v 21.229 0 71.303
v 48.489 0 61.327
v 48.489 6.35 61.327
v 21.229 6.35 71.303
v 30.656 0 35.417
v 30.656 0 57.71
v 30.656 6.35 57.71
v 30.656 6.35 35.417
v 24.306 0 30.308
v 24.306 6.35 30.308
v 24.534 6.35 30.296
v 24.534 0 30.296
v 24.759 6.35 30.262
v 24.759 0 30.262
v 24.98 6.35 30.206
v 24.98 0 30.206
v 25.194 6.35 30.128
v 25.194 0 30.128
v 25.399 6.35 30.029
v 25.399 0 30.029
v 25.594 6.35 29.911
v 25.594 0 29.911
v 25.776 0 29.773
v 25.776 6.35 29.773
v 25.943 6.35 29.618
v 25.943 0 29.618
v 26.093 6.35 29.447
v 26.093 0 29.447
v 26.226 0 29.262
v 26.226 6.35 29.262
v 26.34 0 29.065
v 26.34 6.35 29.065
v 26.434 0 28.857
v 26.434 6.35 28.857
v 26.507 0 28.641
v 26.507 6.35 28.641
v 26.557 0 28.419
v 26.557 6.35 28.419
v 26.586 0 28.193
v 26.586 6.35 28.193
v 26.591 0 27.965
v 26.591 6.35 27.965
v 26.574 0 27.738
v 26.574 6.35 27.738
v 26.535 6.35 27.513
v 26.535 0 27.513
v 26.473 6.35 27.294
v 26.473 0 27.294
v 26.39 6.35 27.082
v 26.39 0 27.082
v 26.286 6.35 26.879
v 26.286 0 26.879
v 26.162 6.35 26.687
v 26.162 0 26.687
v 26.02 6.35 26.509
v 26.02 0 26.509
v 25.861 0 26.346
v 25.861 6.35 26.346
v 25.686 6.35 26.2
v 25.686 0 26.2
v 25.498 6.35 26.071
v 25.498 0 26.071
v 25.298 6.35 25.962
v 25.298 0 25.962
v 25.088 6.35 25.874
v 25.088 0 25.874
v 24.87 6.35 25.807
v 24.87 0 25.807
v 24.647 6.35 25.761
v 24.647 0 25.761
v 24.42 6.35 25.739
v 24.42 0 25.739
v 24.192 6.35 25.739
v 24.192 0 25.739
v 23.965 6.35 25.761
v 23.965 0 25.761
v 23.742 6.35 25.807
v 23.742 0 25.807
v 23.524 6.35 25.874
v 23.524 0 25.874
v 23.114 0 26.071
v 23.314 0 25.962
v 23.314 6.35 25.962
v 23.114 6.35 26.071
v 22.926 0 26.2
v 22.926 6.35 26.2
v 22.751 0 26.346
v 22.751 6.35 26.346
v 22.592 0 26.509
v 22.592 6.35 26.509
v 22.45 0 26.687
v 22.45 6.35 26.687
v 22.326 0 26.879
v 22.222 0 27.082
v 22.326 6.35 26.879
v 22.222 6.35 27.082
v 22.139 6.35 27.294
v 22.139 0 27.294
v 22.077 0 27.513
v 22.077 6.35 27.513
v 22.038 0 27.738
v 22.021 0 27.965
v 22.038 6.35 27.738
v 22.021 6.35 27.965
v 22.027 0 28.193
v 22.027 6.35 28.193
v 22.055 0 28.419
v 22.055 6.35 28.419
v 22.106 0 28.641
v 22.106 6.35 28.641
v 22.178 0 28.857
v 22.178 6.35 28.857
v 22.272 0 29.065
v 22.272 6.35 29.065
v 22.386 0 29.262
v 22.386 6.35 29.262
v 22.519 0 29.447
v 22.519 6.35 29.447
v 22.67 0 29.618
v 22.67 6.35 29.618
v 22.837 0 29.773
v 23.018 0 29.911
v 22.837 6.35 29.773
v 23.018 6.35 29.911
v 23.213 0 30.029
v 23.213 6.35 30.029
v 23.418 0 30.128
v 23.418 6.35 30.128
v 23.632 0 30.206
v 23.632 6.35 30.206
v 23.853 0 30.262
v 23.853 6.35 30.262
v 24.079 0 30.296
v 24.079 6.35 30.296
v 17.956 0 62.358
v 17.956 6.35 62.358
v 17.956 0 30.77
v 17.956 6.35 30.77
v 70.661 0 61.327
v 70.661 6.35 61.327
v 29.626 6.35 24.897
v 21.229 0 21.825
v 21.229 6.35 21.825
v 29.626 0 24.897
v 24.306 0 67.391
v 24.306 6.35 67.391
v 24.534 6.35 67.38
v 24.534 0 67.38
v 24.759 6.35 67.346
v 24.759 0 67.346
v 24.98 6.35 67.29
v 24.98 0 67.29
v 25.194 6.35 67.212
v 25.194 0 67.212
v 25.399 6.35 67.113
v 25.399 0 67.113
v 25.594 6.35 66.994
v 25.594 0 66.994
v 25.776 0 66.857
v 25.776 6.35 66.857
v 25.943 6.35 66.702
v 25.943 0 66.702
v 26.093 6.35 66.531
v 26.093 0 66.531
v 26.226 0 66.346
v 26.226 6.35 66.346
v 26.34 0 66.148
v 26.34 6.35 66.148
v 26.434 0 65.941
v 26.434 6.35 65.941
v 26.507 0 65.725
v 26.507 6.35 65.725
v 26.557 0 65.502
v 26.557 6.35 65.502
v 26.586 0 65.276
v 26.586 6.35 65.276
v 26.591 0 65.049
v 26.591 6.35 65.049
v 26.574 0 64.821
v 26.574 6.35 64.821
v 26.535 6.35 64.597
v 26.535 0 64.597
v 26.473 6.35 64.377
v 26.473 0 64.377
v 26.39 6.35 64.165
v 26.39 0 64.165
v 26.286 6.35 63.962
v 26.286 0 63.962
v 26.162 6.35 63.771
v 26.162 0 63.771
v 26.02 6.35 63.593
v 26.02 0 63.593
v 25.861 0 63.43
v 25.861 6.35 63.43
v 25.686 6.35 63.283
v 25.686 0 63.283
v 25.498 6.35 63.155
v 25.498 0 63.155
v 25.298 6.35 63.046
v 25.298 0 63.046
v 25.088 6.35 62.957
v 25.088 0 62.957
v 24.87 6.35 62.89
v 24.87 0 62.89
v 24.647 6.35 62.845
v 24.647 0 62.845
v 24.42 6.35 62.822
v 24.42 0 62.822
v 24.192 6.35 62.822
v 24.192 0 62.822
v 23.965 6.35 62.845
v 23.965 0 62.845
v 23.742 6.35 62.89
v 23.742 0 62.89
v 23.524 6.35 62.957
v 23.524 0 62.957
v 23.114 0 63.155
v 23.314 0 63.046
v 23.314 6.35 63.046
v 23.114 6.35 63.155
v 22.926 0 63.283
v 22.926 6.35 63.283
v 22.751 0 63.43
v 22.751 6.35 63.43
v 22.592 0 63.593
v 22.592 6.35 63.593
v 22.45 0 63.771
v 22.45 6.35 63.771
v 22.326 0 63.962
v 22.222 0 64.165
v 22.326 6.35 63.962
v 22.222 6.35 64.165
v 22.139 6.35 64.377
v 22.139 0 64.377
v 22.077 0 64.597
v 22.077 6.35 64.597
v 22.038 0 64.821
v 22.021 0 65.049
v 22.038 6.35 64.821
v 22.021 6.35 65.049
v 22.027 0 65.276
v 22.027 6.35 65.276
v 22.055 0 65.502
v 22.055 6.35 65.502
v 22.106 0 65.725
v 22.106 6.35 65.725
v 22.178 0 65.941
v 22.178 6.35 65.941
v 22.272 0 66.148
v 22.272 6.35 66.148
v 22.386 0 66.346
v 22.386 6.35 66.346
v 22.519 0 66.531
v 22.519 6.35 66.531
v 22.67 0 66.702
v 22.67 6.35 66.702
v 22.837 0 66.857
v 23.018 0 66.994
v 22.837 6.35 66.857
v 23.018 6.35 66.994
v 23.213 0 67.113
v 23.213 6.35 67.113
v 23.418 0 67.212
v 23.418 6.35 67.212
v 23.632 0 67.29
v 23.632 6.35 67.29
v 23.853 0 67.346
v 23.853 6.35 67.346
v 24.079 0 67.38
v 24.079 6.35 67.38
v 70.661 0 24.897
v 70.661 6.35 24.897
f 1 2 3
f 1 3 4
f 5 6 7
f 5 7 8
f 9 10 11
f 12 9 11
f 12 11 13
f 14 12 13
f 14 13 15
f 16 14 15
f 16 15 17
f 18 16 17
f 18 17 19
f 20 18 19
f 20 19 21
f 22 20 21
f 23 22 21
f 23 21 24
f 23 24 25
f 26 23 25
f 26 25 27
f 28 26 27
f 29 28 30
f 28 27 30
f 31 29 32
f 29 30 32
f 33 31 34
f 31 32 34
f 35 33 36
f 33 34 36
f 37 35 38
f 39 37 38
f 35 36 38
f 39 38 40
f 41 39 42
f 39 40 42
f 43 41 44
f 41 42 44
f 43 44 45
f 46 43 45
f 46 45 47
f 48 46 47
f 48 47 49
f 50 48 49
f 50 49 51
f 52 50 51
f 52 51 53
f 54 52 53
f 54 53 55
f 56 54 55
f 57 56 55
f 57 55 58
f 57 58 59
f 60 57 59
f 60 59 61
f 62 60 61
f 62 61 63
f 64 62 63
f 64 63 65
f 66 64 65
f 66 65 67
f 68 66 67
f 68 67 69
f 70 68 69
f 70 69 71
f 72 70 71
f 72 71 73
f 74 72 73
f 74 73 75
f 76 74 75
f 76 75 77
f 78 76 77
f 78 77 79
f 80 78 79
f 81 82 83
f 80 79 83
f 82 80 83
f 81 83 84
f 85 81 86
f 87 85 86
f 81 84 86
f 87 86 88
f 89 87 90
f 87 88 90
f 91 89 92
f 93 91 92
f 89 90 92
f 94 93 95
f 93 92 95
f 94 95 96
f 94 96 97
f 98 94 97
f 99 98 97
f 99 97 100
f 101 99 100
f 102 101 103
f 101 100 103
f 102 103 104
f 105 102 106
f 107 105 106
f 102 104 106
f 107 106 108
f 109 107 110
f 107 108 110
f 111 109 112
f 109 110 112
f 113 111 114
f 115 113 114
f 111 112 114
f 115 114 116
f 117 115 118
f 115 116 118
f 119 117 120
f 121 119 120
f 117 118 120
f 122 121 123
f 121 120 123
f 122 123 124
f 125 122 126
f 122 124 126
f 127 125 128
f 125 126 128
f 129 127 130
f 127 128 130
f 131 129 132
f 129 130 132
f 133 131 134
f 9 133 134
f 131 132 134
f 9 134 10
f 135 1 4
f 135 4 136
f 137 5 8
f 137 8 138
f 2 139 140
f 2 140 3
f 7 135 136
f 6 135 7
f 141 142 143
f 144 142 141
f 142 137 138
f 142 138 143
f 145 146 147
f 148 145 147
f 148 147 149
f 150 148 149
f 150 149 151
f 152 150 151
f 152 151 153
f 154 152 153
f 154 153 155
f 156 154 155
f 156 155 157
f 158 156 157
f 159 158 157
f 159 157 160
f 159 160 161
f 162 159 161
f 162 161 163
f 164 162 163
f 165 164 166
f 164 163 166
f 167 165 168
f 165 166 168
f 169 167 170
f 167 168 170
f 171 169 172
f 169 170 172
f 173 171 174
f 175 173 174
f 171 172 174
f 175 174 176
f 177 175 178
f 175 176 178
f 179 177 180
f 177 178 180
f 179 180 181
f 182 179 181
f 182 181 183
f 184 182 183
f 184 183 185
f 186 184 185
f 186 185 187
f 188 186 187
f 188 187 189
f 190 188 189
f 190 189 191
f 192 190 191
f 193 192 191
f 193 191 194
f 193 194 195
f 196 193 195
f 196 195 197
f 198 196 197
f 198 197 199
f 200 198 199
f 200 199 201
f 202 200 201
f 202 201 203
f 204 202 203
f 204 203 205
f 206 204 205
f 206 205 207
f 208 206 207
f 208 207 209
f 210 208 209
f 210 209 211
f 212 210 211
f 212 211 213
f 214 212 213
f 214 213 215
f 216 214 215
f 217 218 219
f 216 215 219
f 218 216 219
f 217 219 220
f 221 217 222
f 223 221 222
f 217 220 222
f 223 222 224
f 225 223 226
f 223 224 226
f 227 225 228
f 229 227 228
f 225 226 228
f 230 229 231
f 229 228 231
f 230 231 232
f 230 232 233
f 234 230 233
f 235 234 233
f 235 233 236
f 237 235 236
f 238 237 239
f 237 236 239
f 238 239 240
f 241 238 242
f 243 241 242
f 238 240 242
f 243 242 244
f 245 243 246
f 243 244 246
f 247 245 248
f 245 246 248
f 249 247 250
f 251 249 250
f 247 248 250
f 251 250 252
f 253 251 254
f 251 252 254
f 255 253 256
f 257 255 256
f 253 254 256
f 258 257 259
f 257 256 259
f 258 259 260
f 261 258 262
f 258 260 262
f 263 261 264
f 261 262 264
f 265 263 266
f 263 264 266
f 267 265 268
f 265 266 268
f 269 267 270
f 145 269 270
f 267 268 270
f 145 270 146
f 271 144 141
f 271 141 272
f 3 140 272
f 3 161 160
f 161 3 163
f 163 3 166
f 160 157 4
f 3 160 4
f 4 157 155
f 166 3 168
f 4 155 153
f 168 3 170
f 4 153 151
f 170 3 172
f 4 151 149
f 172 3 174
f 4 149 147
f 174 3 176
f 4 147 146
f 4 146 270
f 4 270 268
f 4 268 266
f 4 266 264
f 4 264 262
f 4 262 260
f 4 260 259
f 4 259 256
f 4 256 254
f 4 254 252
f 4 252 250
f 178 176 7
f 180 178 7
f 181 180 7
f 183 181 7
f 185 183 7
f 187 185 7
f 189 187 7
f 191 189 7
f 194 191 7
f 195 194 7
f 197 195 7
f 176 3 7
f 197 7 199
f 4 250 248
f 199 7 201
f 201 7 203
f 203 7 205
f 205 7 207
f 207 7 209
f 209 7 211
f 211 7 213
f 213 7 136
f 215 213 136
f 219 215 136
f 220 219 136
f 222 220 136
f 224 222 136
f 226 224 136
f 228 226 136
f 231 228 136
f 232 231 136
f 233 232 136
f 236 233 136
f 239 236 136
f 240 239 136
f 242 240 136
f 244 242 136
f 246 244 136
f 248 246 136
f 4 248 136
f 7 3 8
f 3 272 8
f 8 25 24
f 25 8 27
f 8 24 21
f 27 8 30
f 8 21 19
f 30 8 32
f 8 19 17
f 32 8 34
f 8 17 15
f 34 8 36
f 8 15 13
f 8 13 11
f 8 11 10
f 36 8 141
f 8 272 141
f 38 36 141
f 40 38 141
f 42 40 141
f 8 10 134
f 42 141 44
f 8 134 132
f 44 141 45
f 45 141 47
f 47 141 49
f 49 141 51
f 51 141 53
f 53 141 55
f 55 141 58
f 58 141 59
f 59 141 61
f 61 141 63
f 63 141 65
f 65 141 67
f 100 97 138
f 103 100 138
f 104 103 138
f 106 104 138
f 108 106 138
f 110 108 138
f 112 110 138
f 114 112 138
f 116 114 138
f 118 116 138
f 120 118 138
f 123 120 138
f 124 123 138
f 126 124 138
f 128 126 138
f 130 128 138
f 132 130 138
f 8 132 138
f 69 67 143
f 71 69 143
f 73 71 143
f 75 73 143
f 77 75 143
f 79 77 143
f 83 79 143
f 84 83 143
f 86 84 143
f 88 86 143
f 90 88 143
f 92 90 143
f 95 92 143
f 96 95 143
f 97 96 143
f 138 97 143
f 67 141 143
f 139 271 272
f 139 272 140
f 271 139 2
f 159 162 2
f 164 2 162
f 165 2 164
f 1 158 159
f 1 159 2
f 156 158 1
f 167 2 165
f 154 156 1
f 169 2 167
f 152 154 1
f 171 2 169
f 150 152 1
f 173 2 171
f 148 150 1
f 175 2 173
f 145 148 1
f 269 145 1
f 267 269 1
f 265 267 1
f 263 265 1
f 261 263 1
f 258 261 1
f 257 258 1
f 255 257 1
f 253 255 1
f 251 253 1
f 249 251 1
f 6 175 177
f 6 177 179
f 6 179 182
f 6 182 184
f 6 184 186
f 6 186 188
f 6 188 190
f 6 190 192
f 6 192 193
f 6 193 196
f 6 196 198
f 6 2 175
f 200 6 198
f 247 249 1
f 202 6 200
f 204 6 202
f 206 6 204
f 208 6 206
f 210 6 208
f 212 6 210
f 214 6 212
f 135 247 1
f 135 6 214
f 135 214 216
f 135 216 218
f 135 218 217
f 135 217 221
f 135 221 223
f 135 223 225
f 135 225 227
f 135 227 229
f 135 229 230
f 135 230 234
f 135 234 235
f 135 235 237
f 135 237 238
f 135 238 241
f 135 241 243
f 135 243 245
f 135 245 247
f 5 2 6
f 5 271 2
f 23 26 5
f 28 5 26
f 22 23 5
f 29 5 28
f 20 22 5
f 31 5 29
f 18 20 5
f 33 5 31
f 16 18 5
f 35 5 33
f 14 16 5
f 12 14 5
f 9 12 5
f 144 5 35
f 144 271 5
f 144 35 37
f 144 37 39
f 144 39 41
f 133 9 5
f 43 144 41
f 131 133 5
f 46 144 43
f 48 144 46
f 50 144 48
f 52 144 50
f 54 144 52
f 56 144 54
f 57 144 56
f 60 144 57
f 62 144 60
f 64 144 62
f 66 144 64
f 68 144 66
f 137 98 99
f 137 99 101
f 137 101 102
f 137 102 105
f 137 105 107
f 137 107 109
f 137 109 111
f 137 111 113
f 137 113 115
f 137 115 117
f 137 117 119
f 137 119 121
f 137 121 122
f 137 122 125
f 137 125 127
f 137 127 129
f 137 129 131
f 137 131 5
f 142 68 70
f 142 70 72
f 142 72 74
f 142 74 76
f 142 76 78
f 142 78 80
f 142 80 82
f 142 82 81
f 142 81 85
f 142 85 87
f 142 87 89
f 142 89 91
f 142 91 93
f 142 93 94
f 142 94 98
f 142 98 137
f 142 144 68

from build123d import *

# Parameters (mm, degrees)
BOSS_EXTRUDE1_DEPTH = 6.35
SKETCH2_R           = 2.286
CUT_EXTRUDE1_DEPTH  = 101.585266767


with BuildPart() as part:
    # Sketch1 → Boss-Extrude1 (new body)
    with BuildSketch(Plane(origin=(0, 0, 0), x_dir=(1, 0, 0), z_dir=(0, 1, 0))):
        Polygon((21.229343583, -21.824581583), (29.62595728, -24.897159466), (70.66112252, -24.897159466), (70.66112252, -61.327405263), (48.489495365, -61.327405263), (21.229343583, -71.302728943), (17.95612252, -62.357805865), (30.65612252, -57.710487253), (30.65612252, -35.416823273), (17.95612252, -30.769504661), align=None)
    extrude(amount=BOSS_EXTRUDE1_DEPTH)

    # Sketch2 → Cut-Extrude1 (cut, through all)
    with BuildSketch(Plane(origin=(0, 6.35, 0), x_dir=(1, 0, 0), z_dir=(0, 1, 0))):
        with Locations(Location((24.30612252, -65.105493971, 0), (0, 0, 270))):
            Circle(SKETCH2_R)
        with Locations(Location((24.30612252, -28.021816555, 0), (0, 0, 270))):
            Circle(SKETCH2_R)
    extrude(amount=-CUT_EXTRUDE1_DEPTH, mode=Mode.SUBTRACT)


solid = part.part
